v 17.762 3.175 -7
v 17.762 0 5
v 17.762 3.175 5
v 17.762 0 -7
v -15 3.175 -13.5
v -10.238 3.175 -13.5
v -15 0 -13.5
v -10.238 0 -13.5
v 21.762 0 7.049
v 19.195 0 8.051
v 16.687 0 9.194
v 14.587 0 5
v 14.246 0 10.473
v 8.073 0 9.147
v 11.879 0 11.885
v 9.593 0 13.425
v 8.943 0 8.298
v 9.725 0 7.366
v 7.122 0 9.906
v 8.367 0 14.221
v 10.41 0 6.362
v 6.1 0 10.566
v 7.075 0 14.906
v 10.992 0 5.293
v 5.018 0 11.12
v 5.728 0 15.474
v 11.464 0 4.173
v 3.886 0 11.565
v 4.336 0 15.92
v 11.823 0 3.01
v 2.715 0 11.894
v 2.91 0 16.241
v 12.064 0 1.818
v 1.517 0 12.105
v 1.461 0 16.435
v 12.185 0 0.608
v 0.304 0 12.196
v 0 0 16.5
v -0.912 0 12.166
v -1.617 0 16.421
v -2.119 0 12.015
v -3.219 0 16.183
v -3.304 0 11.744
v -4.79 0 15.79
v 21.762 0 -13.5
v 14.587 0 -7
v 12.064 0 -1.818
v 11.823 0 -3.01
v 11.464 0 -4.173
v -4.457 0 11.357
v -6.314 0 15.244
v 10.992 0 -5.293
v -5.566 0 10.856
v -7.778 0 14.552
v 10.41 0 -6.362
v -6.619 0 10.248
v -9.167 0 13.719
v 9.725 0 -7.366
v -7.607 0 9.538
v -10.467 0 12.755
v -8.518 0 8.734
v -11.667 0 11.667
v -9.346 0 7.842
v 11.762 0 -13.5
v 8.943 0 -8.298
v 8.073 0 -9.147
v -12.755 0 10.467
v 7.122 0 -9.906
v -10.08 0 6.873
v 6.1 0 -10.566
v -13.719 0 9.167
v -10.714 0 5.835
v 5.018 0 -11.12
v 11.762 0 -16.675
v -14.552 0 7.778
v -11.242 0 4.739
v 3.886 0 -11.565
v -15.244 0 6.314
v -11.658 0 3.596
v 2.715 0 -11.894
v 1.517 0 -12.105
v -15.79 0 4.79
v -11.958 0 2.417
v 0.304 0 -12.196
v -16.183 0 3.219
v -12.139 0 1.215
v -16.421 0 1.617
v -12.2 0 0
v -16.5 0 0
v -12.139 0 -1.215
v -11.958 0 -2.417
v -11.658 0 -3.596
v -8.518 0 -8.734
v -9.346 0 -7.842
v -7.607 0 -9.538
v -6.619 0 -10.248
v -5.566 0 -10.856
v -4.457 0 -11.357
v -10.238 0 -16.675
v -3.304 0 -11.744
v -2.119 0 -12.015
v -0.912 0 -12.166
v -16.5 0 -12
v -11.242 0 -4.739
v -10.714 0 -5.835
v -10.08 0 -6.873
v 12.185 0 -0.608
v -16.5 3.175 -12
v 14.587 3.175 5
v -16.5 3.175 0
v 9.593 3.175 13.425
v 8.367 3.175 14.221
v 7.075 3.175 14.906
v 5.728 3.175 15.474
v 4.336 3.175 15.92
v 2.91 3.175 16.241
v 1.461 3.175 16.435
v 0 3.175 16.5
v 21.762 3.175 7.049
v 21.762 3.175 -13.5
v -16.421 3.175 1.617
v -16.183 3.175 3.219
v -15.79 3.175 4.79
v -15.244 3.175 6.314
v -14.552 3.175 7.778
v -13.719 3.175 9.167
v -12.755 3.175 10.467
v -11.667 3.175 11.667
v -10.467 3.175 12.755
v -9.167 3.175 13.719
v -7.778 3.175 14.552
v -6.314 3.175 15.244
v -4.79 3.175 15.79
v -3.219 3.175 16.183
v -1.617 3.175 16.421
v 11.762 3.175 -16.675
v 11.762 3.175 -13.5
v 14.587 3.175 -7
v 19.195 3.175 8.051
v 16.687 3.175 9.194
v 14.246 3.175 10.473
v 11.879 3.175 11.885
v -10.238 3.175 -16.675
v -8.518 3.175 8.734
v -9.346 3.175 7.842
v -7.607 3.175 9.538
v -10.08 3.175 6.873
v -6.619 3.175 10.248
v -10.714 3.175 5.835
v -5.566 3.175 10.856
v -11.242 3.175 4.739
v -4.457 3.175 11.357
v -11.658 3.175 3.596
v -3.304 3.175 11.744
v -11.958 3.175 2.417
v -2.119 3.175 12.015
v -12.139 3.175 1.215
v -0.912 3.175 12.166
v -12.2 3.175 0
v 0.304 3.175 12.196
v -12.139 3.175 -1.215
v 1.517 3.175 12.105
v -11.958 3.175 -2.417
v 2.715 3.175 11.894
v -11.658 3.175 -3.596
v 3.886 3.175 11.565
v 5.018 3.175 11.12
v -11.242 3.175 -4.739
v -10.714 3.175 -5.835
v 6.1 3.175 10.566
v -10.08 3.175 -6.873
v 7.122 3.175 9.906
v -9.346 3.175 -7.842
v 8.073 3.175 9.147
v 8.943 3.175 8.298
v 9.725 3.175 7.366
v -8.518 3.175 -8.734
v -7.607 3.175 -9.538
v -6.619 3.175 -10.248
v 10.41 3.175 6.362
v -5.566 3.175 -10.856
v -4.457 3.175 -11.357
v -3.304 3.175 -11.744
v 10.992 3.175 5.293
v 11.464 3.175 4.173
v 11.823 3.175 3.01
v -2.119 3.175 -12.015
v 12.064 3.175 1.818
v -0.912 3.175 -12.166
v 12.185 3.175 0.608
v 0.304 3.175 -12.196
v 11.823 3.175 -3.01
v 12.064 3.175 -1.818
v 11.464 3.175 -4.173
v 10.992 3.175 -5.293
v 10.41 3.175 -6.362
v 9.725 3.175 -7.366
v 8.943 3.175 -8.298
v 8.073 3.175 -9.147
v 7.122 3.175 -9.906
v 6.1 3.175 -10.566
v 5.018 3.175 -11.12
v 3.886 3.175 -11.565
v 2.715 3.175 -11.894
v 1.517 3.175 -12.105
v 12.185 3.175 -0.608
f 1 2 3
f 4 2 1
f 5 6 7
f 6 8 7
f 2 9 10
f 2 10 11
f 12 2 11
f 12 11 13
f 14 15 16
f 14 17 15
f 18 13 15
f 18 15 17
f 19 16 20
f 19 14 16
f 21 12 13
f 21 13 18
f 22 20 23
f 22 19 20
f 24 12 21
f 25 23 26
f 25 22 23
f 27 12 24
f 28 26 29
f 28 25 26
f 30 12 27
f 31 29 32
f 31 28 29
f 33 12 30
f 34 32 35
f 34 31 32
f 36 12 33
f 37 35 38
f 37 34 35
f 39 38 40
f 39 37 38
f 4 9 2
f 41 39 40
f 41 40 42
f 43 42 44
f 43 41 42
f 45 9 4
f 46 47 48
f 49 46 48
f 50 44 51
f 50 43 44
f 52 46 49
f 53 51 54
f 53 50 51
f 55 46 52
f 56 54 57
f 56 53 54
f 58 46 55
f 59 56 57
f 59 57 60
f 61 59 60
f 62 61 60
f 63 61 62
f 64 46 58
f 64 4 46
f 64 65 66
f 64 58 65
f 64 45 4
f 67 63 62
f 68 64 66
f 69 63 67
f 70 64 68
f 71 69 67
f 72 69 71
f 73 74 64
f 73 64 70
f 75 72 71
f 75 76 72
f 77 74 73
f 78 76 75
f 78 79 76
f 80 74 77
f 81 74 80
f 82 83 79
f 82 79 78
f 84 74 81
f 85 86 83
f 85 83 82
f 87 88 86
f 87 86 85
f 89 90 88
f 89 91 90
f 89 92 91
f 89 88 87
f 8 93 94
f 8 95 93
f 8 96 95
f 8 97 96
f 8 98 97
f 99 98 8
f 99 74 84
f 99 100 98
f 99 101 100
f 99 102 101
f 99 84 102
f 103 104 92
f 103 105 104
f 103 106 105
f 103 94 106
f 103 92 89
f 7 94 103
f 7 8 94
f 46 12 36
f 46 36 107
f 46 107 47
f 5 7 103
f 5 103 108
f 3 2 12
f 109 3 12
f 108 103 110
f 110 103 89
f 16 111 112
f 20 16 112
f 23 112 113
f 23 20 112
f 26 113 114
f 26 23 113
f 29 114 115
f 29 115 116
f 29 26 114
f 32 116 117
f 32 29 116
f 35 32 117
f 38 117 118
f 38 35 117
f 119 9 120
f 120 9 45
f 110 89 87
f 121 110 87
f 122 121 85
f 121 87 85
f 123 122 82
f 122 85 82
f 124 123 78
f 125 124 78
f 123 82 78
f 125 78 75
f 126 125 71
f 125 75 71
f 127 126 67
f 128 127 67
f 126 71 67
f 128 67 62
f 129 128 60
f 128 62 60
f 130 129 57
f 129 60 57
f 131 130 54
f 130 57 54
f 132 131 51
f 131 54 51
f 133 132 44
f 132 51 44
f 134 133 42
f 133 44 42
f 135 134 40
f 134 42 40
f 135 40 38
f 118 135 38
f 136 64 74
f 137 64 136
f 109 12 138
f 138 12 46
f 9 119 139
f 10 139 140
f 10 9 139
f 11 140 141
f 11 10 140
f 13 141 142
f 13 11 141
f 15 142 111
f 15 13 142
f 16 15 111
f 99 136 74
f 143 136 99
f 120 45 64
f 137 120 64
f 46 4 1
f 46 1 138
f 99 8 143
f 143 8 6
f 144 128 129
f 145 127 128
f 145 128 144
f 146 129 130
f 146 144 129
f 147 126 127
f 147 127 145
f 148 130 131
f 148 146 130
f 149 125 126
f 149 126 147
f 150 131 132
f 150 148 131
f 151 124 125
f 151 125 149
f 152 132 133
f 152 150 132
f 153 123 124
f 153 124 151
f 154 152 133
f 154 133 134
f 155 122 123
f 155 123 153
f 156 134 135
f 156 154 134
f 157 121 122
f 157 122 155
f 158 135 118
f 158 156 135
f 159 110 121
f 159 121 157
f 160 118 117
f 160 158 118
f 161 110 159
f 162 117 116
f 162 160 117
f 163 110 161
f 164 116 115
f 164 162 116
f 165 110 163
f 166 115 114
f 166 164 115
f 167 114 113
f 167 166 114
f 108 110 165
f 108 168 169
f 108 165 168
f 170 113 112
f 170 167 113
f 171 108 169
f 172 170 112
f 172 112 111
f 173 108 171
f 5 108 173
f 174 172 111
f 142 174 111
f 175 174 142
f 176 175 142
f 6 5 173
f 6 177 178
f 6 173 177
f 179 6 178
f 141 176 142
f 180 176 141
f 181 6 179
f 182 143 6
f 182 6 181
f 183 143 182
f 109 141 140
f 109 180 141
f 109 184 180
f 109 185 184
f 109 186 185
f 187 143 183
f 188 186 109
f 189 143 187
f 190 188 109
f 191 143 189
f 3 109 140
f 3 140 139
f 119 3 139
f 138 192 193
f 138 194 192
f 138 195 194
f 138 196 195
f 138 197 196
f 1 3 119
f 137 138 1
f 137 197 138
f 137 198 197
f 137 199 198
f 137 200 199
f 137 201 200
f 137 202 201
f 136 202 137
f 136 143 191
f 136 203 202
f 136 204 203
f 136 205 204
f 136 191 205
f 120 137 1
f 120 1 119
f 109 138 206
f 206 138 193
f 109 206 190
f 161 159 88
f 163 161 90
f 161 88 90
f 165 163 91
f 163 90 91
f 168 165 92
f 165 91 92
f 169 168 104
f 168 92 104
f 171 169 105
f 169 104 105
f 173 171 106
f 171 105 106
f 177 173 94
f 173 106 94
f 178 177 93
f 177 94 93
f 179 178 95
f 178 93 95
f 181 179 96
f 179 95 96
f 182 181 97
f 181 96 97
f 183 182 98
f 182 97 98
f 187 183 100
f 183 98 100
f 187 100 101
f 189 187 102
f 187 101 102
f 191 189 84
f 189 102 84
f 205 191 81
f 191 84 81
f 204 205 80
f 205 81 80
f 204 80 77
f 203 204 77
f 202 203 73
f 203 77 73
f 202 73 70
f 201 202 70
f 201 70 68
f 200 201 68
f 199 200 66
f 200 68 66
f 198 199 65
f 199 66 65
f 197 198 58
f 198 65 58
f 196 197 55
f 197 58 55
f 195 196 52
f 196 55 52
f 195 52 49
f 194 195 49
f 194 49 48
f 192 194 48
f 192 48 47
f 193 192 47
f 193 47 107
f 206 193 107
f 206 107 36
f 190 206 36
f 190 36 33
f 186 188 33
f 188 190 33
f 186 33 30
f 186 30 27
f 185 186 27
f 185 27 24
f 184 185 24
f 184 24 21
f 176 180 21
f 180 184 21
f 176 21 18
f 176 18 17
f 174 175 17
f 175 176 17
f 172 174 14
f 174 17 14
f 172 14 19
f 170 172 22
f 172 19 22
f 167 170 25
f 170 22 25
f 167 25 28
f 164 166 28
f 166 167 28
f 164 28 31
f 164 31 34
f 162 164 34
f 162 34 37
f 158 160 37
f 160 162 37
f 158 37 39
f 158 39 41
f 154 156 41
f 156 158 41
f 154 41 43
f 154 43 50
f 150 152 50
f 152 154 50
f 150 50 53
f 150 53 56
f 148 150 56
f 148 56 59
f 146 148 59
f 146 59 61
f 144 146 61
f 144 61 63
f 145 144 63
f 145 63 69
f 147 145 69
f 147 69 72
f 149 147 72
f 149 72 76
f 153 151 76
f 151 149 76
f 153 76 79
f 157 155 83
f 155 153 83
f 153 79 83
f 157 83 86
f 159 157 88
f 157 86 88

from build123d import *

# Parameters (mm, degrees)
BOSS_EXTRUDE1_DEPTH = 3.175
SKETCH2_W           = 3.175
SKETCH2_H           = 14
BOSS_EXTRUDE2_DEPTH = 3.175
BOSS_EXTRUDE3_DEPTH = 3.175
CUT_EXTRUDE2_START  = -10
CUT_EXTRUDE2_DEPTH  = 10
FILLET1_R           = 50
SKETCH6_W           = 6.875
SKETCH6_H           = 3.175
BOSS_EXTRUDE5_DEPTH = 3.11351312
SKETCH7_W           = 11.175
SKETCH7_H           = 3.175
SKETCH7_W_2         = 4.3
CUT_EXTRUDE3_DEPTH  = 5.11351312
BOSS_EXTRUDE6_START = -3.175
BOSS_EXTRUDE6_DEPTH = 3.175
SKETCH9_W           = 3.175
SKETCH9_H           = 14
BOSS_EXTRUDE7_DEPTH = 3.175
SKETCH10_W          = 3.175
SKETCH10_H          = 12
CUT_EXTRUDE4_DEPTH  = 3.175
CUT_EXTRUDE5_DEPTH  = 10
SKETCH14_W          = 22
SKETCH14_H          = 3.175
BOSS_EXTRUDE8_DEPTH = 3.175
CHAMFER1_SIZE       = 1.5


with BuildPart() as part:
    # Sketch1 → Boss-Extrude1 (new body)
    with BuildSketch(Plane(origin=(0, 0, 0), x_dir=(1, 0, 0), z_dir=(0, 1, 0))):
        with BuildLine():
            ThreePointArc((-16.5, 0), (0, -16.5), (16.5, 0))
            Line((16.5, 0), (16.5, 18.61351312))
            Line((16.5, 18.61351312), (12.2, 18.61351312))
            Line((12.2, 18.61351312), (12.2, 0))
            ThreePointArc((12.2, 0), (0, -12.2), (-12.2, 0))
            Line((-12.2, 0), (-12.2, 18))
            Line((-12.2, 18), (-16.5, 18))
            Line((-16.5, 18), (-16.5, 0))
        make_face()
    extrude(amount=BOSS_EXTRUDE1_DEPTH)

    # Sketch2 → Boss-Extrude2 (add)
    with BuildSketch(Plane(origin=(0, 3.175, 0), x_dir=(1, 0, 0), z_dir=(0, 1, 0))):
        with BuildLine():
            Line((15.2, -3.034798181), (15.2, -4.5))
            Line((15.2, -4.5), (15.874507866, -4.5))
            Line((15.874507866, -4.5), (23.375, -4.5))
            Line((23.375, -4.5), (23.375, 15.5))
            Line((23.375, 15.5), (15.2, 15.5))
            Line((15.2, 15.5), (15.2, 3.034798181))
            ThreePointArc((15.2, 3.034798181), (15.424817665, 1.524795068), (15.5, 0))
            ThreePointArc((15.5, 0), (15.424817665, -1.524795068), (15.2, -3.034798181))
        make_face()
        with Locations((18.0875, 4.5)):
            Rectangle(SKETCH2_W, SKETCH2_H, mode=Mode.SUBTRACT)
    extrude(amount=-BOSS_EXTRUDE2_DEPTH)

    # Sketch3 → Boss-Extrude3 (add)
    with BuildSketch(Plane(origin=(0, 0, 0), x_dir=(-1, 0, 0), z_dir=(0, -1, 0))):
        with BuildLine():
            Line((-23.375, -16.5), (0, -16.5))
            ThreePointArc((0, -16.5), (-9.949874371, -13.162446581), (-15.874507866, -4.5))
            Line((-15.874507866, -4.5), (-23.375, -4.5))
            Line((-23.375, -4.5), (-23.375, -16.5))
        make_face()
    extrude(amount=-BOSS_EXTRUDE3_DEPTH)

    # Sketch5 → Cut-Extrude2 (cut)
    with BuildSketch(Plane(origin=(0, 3.175, 0), x_dir=(1, 0, 0), z_dir=(0, 1, 0)).offset(CUT_EXTRUDE2_START)):
        with BuildLine():
            Line((23.375, -6.5), (19.675, -6.5))
            Line((19.675, -6.5), (17.491400843, -6.5))
            Line((17.491400843, -6.5), (15.165750888, -6.5))
            ThreePointArc((15.165750888, -6.5), (9.082951062, -13.774977314), (0, -16.5))
            Line((0, -16.5), (12.165525061, -16.5))
            Line((12.165525061, -16.5), (23.375, -16.5))
            Line((23.375, -16.5), (23.375, -6.5))
        make_face()
    extrude(amount=CUT_EXTRUDE2_DEPTH, mode=Mode.SUBTRACT)

    # Fillet1
    # the kernel refuses this fillet: 50 mm, written as the material it adds along each edge
    with BuildSketch(Plane(origin=(15.165750888, 0, 6.5), x_dir=(-0.6269455789999085, 0, 0.7790630532713443), z_dir=(0, 1, 0))) as fillet1_piece_1:
        with BuildLine():
            CenterArc((22.355625569, 48.152189259), FILLET1_R, 236.629724146, 17.744988352)
            Line((-5.146752438, 6.395522678), (-5.696799998, 5.560389347))
            ThreePointArc((-5.696799998, 5.560389347), (-3.352439272, 2.57081576), (-0.779063053, -0.626945579))
            Line((-0.779063053, -0.626945579), (0.269344886, -0.963043785))
            ThreePointArc((0.269344886, -0.963043785), (4.444190625, -0.390222456), (8.619036364, -0.963043785))
            Line((8.619036364, -0.963043785), (8.88838125, 0))
        make_face()
    extrude(amount=3.175)

    # Sketch6 → Boss-Extrude5 (add)
    with BuildSketch(Plane(origin=(0, 0, -15.5), x_dir=(-1, 0, 0), z_dir=(0, 0, -1))):
        with Locations((-19.9375, 1.5875)):
            Rectangle(SKETCH6_W, SKETCH6_H)
    extrude(amount=BOSS_EXTRUDE5_DEPTH)

    # Sketch7 → Cut-Extrude3 (cut)
    with BuildSketch(Plane(origin=(0, 0, -18.61351312), x_dir=(-1, 0, 0), z_dir=(0, 0, -1))):
        with Locations((-17.7875, 1.5875)):
            Rectangle(SKETCH7_W, SKETCH7_H)
        with Locations((14.35, 1.5875)):
            Rectangle(SKETCH7_W_2, SKETCH7_H)
    extrude(amount=-CUT_EXTRUDE3_DEPTH, mode=Mode.SUBTRACT)

    # Sketch8 → Boss-Extrude6 (add)
    with BuildSketch(Plane(origin=(0, 3.175, 0), x_dir=(1, 0, 0), z_dir=(0, 1, 0)).offset(BOSS_EXTRUDE6_START)):
        with BuildLine():
            Line((-12.2, 13.5), (-12.2, 0))
            ThreePointArc((-12.2, 0), (0, 12.2), (12.2, 0))
            Line((12.2, 0), (12.2, 13.5))
            Line((12.2, 13.5), (-12.2, 13.5))
        make_face()
    extrude(amount=BOSS_EXTRUDE6_DEPTH)

    # Sketch9 → Boss-Extrude7 (add)
    with BuildSketch(Plane(origin=(0, 0, 0), x_dir=(-1, 0, 0), z_dir=(0, -1, 0))):
        with Locations((-18.0875, 4.5)):
            Rectangle(SKETCH9_W, SKETCH9_H)
    extrude(amount=-BOSS_EXTRUDE7_DEPTH)

    # Sketch10 → Cut-Extrude4 (cut)
    with BuildSketch(Plane(origin=(0, 0, 0), x_dir=(-1, 0, 0), z_dir=(0, -1, 0))):
        with Locations((-16.17406463, 1)):
            Rectangle(SKETCH10_W, SKETCH10_H)
    extrude(amount=-CUT_EXTRUDE4_DEPTH, mode=Mode.SUBTRACT)

    # Sketch12 → Cut-Extrude5 (cut)
    with BuildSketch(Plane(origin=(0, 0, 0), x_dir=(-1, 0, 0), z_dir=(0, -1, 0))):
        with BuildLine():
            Line((-21.76156463, -7.048663108), (-21.76156463, 13.5))
            Line((-21.76156463, 13.5), (-23.375, 13.5))
            Line((-23.375, 13.5), (-23.375, -6.5))
            ThreePointArc((-23.375, -6.5), (-22.565944603, -6.767457123), (-21.76156463, -7.048663108))
        make_face()
    extrude(amount=-CUT_EXTRUDE5_DEPTH, mode=Mode.SUBTRACT)

    # Sketch14 → Boss-Extrude8 (add)
    with BuildSketch(Plane(origin=(0, 0, -13.5), x_dir=(-1, 0, 0), z_dir=(0, 0, -1))):
        with Locations((-0.76156463, 1.5875)):
            Rectangle(SKETCH14_W, SKETCH14_H)
    extrude(amount=BOSS_EXTRUDE8_DEPTH)

    # Chamfer1
    chamfer1_edges = [part.edges().sort_by_distance(p)[0] for p in [
        (-16.5, 1.5875, -13.5),
    ]]
    chamfer(chamfer1_edges, length=CHAMFER1_SIZE)


solid = part.part
